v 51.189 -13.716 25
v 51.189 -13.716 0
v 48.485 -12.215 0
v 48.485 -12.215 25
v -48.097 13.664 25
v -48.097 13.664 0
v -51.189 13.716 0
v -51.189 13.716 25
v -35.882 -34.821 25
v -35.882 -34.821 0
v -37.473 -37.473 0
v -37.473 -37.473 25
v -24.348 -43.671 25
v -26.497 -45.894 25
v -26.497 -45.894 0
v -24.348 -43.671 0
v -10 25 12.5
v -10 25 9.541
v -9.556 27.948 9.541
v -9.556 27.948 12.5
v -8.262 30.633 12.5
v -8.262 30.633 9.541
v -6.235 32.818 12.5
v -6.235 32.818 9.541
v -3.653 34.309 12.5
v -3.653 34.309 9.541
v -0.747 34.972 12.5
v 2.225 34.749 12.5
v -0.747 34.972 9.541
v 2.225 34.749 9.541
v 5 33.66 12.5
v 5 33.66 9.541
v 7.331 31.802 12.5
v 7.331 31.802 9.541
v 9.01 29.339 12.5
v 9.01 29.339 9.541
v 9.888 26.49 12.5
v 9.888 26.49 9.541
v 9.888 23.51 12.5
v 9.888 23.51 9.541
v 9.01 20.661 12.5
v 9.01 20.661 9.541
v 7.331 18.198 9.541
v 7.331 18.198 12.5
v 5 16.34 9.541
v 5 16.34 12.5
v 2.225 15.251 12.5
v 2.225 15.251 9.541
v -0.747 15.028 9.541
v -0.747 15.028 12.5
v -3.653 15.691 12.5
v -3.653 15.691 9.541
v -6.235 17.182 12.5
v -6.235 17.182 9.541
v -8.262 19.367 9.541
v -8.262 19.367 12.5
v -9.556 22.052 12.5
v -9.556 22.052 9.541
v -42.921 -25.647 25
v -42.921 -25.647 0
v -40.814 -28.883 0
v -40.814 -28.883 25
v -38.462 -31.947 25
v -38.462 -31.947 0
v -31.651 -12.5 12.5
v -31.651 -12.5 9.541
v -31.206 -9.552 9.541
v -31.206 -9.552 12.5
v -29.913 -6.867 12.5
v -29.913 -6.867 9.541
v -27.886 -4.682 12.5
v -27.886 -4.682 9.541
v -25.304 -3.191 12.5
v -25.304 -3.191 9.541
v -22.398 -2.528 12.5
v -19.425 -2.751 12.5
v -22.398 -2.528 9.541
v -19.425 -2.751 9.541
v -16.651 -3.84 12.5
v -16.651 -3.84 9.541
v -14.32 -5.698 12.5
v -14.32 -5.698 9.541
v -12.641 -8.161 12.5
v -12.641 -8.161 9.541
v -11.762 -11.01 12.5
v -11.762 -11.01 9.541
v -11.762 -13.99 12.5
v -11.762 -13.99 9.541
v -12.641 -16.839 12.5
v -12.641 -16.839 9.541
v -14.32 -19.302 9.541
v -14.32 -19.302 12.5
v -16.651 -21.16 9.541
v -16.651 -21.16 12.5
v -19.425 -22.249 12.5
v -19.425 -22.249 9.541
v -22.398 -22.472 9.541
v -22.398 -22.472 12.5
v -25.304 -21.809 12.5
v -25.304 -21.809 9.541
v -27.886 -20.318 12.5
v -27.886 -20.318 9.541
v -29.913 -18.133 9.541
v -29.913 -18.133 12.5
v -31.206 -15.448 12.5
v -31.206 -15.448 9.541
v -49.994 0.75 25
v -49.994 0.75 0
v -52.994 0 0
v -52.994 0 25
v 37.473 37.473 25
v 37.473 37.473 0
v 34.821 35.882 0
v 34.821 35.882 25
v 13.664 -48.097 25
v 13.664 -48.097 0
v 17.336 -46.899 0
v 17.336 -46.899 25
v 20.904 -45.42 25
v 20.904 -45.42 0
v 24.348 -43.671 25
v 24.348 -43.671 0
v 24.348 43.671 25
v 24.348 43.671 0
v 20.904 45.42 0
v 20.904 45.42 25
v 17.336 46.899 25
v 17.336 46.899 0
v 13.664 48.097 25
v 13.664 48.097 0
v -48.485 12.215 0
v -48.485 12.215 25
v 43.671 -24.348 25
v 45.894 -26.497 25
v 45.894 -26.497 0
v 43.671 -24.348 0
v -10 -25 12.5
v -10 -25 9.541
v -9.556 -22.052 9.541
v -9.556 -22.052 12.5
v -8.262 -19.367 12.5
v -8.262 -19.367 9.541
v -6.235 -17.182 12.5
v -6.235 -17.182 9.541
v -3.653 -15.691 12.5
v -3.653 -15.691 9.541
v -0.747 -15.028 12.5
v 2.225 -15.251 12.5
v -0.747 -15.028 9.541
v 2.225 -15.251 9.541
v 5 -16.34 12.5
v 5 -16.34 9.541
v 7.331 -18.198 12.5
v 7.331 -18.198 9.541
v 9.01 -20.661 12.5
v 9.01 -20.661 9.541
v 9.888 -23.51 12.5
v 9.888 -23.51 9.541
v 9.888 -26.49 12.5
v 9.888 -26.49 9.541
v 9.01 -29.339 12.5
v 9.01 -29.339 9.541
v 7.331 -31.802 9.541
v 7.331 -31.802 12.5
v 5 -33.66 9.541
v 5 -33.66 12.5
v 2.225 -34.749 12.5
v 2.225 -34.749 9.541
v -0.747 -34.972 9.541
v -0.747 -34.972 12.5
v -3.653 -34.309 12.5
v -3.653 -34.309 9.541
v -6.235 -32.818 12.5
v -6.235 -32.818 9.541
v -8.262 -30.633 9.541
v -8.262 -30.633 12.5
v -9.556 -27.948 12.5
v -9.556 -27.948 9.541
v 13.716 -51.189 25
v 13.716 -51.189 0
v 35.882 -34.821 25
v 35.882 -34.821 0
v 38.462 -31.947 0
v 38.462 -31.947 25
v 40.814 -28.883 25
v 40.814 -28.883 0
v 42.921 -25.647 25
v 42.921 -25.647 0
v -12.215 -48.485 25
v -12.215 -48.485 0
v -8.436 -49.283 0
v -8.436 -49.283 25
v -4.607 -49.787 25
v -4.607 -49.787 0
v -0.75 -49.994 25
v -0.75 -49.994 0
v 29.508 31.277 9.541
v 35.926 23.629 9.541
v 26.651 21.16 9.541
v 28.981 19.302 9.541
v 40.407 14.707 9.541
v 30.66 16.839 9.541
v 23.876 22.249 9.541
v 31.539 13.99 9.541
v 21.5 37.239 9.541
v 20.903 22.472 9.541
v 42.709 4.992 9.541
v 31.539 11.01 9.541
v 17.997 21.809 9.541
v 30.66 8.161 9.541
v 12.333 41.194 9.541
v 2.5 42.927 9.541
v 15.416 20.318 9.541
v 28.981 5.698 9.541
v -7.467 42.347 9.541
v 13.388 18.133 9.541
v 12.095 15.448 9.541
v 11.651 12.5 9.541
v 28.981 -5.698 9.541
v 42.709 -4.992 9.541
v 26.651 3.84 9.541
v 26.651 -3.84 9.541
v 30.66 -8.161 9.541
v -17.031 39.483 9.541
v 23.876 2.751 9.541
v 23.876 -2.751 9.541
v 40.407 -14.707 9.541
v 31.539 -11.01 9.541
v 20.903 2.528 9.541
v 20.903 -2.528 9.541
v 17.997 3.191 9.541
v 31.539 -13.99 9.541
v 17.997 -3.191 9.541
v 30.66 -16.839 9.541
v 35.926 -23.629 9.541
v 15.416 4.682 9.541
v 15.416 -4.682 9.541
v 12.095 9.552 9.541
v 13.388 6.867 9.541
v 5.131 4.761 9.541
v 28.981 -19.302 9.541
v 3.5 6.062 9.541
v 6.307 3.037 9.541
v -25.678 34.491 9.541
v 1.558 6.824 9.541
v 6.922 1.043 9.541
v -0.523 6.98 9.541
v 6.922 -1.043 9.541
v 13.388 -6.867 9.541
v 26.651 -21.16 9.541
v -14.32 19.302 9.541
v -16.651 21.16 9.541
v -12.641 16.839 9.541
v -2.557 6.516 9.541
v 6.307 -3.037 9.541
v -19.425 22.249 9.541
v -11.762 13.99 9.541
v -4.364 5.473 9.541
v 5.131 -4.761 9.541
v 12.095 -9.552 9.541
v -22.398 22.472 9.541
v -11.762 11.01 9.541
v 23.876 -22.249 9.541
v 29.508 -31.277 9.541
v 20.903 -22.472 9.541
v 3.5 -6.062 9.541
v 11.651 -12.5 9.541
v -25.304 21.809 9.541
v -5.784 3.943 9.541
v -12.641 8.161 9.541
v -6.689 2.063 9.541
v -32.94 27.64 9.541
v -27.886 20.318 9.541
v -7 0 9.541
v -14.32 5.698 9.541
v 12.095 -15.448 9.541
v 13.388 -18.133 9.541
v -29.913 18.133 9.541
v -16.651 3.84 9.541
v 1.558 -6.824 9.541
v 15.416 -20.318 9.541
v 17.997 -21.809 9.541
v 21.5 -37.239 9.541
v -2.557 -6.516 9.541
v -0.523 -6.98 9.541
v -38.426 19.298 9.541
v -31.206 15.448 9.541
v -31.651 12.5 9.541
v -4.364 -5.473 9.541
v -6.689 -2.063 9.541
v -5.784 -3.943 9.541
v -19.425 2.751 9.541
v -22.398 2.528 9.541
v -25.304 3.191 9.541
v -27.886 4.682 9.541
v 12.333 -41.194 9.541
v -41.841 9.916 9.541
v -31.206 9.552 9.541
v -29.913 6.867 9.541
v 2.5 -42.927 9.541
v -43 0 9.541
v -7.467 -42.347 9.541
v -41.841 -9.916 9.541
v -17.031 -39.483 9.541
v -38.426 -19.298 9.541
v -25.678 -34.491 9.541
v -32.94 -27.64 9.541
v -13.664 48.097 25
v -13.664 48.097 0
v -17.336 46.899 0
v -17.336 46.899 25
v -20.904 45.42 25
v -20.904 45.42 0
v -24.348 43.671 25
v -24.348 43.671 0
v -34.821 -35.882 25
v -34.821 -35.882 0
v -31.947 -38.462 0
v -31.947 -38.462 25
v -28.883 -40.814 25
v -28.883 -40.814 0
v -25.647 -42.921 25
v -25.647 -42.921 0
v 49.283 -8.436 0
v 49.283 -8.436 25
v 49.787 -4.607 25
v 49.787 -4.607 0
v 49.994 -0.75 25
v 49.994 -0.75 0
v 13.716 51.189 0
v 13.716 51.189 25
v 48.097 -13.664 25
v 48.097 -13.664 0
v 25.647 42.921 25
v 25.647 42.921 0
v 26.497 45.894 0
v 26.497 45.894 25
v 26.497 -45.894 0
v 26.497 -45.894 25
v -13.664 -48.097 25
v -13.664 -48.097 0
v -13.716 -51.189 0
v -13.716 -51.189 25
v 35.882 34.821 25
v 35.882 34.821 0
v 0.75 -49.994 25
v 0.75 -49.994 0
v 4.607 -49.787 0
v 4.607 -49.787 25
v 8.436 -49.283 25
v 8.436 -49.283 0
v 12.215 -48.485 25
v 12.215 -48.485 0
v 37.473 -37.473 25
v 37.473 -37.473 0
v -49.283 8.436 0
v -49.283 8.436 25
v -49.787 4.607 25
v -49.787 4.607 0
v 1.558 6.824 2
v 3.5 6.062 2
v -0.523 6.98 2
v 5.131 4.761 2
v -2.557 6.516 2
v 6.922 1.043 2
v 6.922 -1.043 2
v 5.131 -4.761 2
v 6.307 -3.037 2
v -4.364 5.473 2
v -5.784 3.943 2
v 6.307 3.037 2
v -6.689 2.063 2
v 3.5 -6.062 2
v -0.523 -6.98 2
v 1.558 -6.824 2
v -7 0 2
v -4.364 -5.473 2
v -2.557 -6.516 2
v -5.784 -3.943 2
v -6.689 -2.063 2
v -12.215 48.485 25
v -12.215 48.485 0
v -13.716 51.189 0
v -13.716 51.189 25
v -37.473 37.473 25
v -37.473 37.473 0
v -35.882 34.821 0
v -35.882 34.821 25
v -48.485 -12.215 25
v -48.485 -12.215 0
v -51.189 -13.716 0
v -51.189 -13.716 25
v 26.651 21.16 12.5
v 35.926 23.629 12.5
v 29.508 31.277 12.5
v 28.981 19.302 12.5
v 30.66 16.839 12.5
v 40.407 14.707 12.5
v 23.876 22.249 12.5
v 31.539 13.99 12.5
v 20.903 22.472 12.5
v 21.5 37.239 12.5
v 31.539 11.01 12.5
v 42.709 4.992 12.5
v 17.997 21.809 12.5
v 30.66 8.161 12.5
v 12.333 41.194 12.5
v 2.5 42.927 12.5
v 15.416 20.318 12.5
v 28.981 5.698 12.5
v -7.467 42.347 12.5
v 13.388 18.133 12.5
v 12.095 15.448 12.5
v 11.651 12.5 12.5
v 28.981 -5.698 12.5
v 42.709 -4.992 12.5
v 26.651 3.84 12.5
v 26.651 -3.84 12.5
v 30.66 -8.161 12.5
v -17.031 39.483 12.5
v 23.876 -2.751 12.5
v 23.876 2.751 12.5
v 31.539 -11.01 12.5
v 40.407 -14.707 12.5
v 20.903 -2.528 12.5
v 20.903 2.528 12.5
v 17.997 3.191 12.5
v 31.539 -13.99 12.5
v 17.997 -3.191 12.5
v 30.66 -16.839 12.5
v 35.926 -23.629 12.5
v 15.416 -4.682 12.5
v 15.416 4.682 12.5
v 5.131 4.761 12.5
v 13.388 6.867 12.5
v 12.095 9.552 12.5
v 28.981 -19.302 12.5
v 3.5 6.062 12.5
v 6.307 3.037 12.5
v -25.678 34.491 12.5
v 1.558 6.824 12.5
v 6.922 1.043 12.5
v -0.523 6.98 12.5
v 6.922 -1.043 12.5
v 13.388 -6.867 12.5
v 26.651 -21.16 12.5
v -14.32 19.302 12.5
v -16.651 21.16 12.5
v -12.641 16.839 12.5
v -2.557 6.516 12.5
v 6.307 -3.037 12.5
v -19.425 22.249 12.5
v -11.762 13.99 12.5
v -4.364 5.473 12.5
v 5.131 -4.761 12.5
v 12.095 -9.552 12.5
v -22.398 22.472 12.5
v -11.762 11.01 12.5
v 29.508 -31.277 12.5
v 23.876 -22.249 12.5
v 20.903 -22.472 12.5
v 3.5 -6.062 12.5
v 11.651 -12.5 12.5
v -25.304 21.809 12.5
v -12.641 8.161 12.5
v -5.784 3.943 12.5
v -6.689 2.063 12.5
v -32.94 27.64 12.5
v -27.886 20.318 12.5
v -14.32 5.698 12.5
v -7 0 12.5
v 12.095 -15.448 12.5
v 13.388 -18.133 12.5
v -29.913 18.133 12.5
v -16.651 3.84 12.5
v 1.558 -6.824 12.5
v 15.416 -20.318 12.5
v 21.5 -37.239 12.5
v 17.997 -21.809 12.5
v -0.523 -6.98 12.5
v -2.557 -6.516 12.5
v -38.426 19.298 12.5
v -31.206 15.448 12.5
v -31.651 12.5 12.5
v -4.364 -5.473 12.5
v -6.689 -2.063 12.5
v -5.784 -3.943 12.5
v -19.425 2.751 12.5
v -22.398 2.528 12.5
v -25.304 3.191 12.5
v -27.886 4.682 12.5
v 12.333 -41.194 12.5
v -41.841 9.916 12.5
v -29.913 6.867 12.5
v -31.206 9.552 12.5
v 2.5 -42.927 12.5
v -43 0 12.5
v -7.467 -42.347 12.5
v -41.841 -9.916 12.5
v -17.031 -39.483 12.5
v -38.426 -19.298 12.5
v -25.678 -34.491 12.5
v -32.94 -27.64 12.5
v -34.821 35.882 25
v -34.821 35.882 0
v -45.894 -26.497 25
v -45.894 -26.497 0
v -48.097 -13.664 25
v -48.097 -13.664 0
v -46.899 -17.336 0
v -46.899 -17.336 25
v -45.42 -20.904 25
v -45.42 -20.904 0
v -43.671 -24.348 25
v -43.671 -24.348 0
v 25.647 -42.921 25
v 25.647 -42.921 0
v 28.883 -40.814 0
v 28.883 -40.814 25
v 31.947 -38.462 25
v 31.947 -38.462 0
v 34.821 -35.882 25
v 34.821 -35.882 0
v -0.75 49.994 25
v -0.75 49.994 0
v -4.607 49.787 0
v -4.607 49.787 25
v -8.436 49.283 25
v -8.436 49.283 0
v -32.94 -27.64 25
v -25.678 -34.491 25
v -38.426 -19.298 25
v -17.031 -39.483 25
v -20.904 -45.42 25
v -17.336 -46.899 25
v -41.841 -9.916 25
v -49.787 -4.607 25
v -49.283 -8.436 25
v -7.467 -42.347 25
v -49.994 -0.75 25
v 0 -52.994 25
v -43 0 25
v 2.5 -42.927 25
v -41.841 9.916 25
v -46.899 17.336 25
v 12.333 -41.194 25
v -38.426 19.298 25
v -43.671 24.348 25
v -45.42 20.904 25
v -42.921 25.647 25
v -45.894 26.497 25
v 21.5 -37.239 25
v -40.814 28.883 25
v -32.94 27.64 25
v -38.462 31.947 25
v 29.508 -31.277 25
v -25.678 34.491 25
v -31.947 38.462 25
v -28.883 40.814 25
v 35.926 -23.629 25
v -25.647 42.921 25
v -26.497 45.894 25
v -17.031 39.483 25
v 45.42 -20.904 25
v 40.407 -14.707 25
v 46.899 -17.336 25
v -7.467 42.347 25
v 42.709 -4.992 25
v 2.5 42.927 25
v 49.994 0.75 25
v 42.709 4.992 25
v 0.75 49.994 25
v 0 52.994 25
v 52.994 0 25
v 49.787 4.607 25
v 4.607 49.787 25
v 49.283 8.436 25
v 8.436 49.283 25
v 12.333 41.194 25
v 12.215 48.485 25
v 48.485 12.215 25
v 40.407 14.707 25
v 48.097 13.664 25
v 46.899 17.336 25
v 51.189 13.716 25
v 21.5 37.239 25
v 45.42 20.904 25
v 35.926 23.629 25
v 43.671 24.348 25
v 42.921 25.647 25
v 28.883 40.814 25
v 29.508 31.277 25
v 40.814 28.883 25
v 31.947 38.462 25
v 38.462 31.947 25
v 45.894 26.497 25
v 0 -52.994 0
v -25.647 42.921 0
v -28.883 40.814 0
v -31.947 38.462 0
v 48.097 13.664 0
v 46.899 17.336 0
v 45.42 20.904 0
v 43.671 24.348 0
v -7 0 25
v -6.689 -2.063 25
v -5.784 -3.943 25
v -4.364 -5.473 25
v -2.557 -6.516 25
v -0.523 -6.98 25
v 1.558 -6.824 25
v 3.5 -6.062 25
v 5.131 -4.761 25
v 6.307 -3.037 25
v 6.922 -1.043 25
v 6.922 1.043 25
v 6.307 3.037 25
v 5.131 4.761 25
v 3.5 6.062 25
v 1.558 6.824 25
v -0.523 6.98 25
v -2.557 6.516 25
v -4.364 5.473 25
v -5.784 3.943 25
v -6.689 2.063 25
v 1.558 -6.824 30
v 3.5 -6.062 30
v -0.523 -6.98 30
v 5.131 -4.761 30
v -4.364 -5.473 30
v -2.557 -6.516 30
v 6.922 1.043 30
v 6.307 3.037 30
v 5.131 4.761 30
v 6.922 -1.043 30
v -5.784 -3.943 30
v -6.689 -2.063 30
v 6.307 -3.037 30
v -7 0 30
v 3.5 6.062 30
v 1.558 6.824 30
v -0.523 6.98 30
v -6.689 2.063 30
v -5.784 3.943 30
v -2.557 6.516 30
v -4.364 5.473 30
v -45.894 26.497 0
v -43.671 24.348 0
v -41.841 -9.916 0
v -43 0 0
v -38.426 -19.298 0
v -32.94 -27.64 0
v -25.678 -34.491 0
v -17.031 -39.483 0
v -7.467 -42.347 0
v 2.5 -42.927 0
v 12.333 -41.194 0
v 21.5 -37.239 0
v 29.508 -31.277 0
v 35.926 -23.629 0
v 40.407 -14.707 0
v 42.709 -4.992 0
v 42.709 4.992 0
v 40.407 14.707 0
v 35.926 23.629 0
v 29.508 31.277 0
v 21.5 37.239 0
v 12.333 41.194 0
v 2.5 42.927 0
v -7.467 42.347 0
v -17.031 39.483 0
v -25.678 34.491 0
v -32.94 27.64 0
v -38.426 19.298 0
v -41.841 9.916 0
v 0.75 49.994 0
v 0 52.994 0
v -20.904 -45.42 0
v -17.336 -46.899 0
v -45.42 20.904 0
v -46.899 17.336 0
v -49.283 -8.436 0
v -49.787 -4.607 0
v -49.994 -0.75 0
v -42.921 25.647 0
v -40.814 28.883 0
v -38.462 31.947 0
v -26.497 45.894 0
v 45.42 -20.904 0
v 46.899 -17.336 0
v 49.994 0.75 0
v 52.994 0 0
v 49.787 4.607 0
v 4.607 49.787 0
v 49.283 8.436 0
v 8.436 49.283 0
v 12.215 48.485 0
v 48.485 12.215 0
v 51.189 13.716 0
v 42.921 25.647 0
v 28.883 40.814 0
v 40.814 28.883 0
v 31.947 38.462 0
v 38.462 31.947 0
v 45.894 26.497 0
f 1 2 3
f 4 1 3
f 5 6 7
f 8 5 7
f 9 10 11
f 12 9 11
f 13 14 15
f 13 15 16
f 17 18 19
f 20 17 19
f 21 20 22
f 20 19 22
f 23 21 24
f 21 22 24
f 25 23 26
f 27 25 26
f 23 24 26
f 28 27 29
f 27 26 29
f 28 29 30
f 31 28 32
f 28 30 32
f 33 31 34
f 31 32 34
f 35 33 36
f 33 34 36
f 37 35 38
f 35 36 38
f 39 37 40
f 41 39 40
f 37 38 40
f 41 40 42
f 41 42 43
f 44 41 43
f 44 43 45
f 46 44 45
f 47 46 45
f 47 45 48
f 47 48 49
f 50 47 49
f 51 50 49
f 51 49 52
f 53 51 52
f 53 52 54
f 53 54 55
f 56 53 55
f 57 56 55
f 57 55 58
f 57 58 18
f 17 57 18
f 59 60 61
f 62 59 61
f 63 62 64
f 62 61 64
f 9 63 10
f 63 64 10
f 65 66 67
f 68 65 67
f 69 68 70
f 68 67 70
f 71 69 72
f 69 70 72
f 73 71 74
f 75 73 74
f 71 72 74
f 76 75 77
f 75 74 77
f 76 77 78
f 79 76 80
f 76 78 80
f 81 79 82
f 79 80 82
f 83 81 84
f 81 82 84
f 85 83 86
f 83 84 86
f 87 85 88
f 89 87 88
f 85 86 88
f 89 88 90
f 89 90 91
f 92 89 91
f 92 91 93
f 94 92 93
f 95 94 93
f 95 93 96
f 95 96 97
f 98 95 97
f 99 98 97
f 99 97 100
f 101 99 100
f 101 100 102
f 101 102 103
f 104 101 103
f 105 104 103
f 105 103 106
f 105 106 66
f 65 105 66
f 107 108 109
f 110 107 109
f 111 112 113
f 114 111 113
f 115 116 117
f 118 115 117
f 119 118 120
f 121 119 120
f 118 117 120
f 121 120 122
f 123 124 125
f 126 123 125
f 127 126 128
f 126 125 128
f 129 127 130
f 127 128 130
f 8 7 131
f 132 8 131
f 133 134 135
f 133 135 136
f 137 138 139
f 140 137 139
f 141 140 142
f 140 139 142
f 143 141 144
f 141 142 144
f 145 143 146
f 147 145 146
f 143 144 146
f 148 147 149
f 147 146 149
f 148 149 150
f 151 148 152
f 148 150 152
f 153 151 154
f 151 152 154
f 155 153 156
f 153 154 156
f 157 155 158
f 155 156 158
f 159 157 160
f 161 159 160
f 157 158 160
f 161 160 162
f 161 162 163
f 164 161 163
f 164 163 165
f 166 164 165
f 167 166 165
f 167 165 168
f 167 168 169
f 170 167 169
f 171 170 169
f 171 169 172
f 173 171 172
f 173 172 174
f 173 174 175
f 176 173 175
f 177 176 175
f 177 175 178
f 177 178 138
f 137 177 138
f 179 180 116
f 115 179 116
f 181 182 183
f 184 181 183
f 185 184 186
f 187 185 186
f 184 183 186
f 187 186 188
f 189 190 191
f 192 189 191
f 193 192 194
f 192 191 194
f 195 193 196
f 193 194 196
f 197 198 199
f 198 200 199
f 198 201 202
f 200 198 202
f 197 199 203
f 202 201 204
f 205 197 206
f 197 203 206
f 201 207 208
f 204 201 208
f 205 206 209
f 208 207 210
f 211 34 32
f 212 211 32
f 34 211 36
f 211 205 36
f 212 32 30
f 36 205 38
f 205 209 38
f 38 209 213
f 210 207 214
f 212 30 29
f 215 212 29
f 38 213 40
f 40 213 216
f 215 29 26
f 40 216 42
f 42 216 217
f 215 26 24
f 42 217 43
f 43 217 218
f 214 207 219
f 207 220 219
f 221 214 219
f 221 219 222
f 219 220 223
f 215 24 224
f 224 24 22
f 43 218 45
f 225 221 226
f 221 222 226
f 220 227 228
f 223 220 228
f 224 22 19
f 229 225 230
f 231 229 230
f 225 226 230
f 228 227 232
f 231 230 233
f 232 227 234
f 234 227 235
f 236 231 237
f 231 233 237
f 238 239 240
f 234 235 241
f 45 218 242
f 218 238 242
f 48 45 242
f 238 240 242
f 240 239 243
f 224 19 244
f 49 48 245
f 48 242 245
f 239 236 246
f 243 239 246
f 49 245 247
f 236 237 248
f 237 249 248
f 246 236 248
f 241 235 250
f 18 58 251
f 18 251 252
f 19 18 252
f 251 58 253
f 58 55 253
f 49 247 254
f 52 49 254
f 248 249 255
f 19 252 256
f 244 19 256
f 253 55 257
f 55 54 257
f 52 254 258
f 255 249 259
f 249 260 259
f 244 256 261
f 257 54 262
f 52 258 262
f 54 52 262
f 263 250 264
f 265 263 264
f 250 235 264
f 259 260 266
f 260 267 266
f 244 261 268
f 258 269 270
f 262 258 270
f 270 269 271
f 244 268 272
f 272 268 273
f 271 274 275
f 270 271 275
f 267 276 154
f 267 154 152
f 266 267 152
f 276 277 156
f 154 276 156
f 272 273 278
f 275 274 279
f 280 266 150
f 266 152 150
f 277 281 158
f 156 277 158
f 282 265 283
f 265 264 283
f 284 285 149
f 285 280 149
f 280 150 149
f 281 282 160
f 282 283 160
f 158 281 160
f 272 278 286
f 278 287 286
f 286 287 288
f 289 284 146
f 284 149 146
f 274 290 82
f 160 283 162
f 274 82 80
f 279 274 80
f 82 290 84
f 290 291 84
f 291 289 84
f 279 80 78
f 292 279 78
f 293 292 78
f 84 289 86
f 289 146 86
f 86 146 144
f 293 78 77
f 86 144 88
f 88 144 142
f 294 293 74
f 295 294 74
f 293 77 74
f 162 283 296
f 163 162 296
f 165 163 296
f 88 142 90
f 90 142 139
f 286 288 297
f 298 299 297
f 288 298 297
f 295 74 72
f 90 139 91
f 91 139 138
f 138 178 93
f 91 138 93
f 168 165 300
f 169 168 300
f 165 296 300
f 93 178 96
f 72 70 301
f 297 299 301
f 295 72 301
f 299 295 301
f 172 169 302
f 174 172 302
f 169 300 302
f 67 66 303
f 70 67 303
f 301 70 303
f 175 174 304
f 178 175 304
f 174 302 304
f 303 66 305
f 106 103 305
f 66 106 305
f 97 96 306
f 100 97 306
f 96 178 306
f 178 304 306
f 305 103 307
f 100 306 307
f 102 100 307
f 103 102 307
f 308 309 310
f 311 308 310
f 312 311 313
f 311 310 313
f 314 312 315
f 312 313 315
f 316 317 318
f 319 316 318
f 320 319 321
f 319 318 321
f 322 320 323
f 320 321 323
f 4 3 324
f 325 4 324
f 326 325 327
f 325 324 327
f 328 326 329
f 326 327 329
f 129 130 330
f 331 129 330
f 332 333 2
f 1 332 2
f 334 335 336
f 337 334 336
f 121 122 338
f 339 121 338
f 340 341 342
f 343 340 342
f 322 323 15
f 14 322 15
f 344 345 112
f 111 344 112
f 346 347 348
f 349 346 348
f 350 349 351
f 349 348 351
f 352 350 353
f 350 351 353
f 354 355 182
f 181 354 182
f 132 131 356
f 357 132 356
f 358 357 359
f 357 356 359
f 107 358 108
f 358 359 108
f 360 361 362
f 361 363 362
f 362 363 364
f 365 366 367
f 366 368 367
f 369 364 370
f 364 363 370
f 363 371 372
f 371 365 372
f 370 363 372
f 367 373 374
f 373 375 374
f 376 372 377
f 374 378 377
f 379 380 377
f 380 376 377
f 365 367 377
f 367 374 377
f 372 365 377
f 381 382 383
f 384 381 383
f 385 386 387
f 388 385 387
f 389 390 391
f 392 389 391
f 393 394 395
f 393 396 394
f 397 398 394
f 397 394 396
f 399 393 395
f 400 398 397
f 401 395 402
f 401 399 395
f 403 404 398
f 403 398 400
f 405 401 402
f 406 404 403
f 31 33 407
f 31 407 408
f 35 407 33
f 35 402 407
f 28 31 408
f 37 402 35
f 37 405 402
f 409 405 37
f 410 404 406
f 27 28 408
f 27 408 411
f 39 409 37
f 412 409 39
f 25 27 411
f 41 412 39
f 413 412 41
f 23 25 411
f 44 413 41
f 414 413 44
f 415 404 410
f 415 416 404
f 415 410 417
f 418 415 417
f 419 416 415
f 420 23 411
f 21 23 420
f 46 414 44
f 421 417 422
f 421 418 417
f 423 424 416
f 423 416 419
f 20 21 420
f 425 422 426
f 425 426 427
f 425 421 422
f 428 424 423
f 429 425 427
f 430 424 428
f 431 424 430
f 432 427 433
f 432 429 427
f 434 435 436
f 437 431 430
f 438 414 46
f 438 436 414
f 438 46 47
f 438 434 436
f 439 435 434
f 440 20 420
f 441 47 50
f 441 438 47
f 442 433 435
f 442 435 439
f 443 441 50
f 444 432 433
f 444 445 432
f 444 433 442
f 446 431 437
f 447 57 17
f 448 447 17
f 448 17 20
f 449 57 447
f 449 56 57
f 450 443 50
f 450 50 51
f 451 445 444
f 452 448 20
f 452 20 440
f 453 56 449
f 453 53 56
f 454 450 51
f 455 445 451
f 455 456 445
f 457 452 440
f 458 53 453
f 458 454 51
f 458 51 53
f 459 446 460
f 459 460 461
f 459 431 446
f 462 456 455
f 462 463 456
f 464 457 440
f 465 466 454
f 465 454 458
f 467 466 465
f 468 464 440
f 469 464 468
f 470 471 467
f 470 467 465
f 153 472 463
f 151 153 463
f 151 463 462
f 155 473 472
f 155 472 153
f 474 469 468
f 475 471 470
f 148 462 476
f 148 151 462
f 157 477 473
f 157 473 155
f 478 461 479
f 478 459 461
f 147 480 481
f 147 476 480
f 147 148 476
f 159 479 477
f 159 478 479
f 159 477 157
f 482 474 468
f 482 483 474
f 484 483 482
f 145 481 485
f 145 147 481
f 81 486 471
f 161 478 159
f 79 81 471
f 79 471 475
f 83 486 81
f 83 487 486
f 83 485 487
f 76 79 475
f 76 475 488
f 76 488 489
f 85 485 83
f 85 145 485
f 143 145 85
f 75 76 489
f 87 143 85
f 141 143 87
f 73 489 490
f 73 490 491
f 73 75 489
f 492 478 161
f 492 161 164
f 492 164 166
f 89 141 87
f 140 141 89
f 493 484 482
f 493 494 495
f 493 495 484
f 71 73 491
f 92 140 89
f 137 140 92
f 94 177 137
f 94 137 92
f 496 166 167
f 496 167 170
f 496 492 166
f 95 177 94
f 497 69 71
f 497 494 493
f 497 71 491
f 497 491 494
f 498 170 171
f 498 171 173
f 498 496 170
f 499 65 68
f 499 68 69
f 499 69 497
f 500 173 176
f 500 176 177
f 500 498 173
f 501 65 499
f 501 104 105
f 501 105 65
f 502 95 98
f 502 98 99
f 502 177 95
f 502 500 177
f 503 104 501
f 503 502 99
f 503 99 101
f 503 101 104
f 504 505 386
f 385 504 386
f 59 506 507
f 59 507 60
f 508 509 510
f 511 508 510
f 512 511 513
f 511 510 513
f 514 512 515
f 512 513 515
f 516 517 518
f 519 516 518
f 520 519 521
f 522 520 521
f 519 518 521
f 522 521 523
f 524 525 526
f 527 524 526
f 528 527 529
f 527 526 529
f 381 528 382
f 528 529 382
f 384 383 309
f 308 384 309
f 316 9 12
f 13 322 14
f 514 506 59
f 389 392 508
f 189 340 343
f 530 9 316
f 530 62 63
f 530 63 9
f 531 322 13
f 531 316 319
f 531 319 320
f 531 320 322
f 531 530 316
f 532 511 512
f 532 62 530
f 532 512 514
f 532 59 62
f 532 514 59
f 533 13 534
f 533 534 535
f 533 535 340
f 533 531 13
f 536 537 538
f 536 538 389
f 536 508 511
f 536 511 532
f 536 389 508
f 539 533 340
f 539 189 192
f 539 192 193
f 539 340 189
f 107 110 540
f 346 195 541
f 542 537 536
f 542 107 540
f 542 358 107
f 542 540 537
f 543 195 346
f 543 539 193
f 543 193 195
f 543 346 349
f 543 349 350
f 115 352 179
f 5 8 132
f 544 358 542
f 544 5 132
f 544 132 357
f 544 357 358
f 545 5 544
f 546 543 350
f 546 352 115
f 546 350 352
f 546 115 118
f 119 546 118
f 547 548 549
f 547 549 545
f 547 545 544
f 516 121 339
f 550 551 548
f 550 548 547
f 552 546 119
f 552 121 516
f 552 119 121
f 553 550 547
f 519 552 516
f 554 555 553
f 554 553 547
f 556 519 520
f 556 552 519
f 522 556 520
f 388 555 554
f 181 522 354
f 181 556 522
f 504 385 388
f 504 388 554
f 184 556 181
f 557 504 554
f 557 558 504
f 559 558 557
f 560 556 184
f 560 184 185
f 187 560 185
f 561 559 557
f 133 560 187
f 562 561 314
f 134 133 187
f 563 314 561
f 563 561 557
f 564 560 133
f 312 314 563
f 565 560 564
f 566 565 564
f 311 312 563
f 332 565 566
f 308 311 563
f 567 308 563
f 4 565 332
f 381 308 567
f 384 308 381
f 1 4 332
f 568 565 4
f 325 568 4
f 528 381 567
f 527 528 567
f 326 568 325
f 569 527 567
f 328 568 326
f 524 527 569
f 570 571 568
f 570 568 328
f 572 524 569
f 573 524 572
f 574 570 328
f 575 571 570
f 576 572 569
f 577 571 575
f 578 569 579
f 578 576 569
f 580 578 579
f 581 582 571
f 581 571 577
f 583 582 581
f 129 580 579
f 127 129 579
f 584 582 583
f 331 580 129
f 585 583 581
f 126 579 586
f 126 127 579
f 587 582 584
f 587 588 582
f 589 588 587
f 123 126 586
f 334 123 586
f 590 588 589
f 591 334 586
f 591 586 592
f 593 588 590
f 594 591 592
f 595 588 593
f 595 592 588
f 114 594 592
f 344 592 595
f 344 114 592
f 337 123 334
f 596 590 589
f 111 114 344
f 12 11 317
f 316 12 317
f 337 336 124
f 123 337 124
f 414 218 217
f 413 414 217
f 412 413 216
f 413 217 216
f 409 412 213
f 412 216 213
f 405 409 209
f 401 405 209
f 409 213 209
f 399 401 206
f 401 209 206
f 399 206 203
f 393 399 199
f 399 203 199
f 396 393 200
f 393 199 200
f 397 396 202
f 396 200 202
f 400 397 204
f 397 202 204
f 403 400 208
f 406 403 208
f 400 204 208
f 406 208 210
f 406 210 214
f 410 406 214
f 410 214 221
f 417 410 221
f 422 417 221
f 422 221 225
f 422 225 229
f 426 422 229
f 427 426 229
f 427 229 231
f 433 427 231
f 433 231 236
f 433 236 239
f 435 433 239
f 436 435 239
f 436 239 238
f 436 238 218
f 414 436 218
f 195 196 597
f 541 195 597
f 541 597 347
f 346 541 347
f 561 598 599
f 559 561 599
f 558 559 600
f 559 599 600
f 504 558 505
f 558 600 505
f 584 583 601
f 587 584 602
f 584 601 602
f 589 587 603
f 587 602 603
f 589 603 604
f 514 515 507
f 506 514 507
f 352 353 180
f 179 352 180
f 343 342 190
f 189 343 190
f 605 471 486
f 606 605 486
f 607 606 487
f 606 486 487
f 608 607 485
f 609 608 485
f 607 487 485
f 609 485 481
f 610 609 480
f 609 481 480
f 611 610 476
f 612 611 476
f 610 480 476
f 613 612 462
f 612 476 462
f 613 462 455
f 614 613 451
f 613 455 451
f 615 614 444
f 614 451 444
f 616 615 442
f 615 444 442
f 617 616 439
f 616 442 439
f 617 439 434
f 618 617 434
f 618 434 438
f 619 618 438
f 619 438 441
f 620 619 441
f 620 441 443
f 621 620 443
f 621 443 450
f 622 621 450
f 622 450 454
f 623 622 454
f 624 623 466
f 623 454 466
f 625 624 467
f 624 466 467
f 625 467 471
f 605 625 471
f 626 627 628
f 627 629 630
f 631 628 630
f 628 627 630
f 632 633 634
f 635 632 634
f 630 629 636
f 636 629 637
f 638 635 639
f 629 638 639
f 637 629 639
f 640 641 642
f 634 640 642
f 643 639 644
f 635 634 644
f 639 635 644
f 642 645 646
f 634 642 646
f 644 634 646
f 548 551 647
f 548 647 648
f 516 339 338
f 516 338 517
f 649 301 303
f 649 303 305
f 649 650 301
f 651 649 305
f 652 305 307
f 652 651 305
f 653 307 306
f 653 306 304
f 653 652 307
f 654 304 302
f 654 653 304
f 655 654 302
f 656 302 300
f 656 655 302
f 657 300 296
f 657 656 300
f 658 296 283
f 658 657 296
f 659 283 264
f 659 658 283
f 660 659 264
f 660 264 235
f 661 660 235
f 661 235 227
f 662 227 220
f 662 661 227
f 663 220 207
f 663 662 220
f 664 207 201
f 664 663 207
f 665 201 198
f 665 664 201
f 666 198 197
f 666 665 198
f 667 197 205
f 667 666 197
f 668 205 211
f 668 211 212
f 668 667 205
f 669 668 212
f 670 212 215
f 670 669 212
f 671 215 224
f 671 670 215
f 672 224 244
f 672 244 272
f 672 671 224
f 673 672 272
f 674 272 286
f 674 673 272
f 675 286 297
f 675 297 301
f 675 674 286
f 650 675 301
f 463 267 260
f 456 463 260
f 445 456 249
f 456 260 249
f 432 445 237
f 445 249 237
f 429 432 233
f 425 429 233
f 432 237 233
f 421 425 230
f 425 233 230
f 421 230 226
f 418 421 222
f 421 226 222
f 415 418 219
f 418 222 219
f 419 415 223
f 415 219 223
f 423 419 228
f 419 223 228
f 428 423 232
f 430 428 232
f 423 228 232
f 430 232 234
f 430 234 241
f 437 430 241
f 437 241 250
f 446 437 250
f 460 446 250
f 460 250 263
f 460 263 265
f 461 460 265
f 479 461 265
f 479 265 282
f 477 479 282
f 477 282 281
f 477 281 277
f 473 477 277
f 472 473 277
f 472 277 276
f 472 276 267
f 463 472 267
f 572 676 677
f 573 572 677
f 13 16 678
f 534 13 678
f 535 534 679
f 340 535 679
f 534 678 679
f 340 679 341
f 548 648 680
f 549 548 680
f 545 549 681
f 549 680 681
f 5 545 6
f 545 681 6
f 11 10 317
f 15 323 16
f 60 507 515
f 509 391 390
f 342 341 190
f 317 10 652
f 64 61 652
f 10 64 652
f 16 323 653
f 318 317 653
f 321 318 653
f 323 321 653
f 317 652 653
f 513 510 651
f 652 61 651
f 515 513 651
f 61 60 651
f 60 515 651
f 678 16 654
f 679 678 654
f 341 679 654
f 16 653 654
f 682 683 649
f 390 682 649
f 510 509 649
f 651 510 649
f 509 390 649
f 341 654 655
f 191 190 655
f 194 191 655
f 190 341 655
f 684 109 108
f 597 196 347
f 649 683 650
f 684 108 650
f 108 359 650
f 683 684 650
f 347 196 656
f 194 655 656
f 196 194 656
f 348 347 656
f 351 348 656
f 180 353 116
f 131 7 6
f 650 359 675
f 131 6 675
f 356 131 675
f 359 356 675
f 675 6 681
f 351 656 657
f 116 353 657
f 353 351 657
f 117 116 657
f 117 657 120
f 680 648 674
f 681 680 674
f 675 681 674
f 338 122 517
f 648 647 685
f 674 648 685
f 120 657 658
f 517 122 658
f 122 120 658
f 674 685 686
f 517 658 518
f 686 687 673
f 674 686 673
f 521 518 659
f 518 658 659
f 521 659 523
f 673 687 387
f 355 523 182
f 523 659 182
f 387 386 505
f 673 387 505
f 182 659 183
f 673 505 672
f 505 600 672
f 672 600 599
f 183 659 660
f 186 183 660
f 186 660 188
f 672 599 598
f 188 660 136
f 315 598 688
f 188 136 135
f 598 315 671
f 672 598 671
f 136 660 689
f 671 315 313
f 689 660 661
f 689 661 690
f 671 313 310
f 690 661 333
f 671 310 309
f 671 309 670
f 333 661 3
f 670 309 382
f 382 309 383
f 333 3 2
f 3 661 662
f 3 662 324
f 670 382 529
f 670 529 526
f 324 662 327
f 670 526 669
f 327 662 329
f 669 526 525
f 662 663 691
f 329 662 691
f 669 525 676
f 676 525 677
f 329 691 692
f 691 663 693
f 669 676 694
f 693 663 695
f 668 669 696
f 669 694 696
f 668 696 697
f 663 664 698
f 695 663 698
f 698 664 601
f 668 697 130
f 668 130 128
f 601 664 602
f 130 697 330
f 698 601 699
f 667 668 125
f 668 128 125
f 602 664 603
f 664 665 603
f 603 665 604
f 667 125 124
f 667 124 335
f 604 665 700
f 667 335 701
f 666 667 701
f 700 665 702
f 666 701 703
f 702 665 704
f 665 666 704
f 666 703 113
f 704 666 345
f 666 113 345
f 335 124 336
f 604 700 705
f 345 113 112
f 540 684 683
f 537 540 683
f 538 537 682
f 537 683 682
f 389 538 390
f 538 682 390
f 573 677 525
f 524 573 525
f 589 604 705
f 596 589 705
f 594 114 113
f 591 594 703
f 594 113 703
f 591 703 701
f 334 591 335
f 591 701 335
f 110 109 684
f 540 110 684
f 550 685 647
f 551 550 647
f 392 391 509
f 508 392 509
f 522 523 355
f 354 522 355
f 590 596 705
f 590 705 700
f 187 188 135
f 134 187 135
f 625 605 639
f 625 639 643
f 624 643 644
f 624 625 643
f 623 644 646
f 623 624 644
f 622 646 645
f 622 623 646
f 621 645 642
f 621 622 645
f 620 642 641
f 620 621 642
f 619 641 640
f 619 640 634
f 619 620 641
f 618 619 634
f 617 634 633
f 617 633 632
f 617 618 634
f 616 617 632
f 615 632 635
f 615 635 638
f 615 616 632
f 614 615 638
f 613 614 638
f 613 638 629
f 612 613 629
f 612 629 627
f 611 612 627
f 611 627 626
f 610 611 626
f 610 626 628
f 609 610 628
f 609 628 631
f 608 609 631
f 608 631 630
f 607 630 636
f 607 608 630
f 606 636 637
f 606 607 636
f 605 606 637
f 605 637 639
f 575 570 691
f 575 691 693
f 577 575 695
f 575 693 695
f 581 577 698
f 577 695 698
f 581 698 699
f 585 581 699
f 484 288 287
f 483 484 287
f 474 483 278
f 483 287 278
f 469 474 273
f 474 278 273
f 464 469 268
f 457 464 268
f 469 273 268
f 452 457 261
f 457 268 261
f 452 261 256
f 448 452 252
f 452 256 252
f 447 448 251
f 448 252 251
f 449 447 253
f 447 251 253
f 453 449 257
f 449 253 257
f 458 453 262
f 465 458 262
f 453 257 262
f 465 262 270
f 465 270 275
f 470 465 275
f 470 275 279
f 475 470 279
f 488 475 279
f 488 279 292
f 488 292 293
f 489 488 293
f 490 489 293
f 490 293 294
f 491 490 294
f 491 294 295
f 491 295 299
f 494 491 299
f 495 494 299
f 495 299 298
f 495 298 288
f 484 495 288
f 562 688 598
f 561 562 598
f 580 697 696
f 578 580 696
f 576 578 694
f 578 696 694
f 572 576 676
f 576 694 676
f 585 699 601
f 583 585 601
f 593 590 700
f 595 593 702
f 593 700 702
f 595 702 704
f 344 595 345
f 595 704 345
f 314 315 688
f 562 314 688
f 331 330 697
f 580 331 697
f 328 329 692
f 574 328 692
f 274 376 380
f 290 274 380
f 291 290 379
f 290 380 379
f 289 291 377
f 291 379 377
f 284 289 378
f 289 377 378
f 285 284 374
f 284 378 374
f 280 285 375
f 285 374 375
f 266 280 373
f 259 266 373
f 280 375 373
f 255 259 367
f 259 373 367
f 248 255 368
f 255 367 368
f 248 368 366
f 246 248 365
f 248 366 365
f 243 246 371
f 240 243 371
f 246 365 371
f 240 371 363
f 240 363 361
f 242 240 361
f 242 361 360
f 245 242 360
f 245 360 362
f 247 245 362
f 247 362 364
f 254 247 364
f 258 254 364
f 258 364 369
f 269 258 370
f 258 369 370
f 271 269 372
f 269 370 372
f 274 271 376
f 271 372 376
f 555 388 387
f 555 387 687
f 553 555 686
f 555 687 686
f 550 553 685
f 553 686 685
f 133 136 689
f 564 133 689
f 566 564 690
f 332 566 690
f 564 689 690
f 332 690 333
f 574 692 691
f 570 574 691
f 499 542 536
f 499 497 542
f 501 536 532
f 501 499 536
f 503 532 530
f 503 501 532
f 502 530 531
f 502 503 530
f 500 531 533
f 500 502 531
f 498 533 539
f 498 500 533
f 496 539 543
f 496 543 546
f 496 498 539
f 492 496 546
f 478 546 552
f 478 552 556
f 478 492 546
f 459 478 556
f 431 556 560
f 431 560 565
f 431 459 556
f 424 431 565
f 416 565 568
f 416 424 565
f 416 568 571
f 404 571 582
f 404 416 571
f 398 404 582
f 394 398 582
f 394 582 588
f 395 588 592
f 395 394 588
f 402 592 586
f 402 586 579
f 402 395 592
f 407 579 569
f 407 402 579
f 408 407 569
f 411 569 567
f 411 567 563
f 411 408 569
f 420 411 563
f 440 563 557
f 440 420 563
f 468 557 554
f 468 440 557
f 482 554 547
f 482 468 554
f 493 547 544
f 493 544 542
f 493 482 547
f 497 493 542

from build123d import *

# Parameters (mm, degrees)
SKETCH1_R           = 50
BOSS_EXTRUDE1_DEPTH = 25
SKETCH2_W           = 9.541105513
SKETCH2_H           = 36
SKETCH2_W_2         = 12.5
SKETCH2_4_W         = 9.541105513
SKETCH2_4_H         = 36
SKETCH2_4_W_2       = 12.5
SKETCH5_W           = 5
SKETCH5_H           = 7
SKETCH6_W           = 2
SKETCH6_H           = 9
SKETCH7_R           = 10
CUT_EXTRUDE1_DEPTH  = 74.610911988
BOSS_EXTRUDE2_DEPTH = 25
CIRPATTERN1_DEPTH   = 25


# Read off the part's stored shape, not the designer's step: CirPattern1
with BuildPart() as part:
    # Sketch1 → Boss-Extrude1 (new body)
    with BuildSketch(Plane.XY):
        Circle(SKETCH1_R)
    extrude(amount=BOSS_EXTRUDE1_DEPTH)

    # Sketch2 → Revolve1 (revolve)
    with BuildSketch(Plane(origin=(0, 0, 0), x_dir=(0, 0, -1), z_dir=(1, 0, 0))):
        with Locations((-4.770552756, -25)):
            Rectangle(SKETCH2_W, SKETCH2_H)
        with Locations((-18.75, -25)):
            Rectangle(SKETCH2_W_2, SKETCH2_H)
    revolve(axis=Axis((0, 0, -54.580519766), (0, 0, 1)))

    # Sketch2<4> → Cut-Revolve1 (revolve, cut)
    with BuildSketch(Plane(origin=(0, 0, 0), x_dir=(0, 0, -1), z_dir=(1, 0, 0)), mode=Mode.PRIVATE) as cut_revolve1_sk:
        with Locations((-4.770552756, -25)):
            Rectangle(SKETCH2_4_W, SKETCH2_4_H)
        with Locations((-18.75, -25)):
            Rectangle(SKETCH2_4_W_2, SKETCH2_4_H)
    revolve(cut_revolve1_sk.sketch.rotate(Axis((0, 0, -54.580519766), (0, 0, 1)), 270), axis=Axis((0, 0, -54.580519766), (0, 0, 1)), mode=Mode.SUBTRACT)

    # Sketch5 → Revolve3 (revolve)
    with BuildSketch(Plane(origin=(0, 0, 0), x_dir=(0, 0, -1), z_dir=(1, 0, 0)), mode=Mode.PRIVATE) as revolve3_sk:
        with Locations((-27.5, -3.5)):
            Rectangle(SKETCH5_W, SKETCH5_H)
    revolve(revolve3_sk.sketch.rotate(Axis((0, 0, 64.707463348), (0, 0, -1)), 90), axis=Axis((0, 0, 64.707463348), (0, 0, -1)))

    # Sketch6 → Cut-Revolve2 (revolve, cut)
    with BuildSketch(Plane(origin=(0, 0, 0), x_dir=(0, 0, -1), z_dir=(1, 0, 0)), mode=Mode.PRIVATE) as cut_revolve2_sk:
        with Locations((-1, -4.5)):
            Rectangle(SKETCH6_W, SKETCH6_H)
    revolve(cut_revolve2_sk.sketch.rotate(Axis((0, 0, -41.001610393), (0, 0, 1)), 270), axis=Axis((0, 0, -41.001610393), (0, 0, 1)), mode=Mode.SUBTRACT)

    # Sketch7 → Cut-Extrude1 (cut, through all)
    with BuildSketch(Plane(origin=(0, 0, 9.541105513), x_dir=(-1, 0, 0), z_dir=(0, 0, -1))):
        with Locations((0, 25)):
            Circle(SKETCH7_R)
        with Locations((21.650635095, 12.5)):
            Circle(SKETCH7_R)
        with Locations((21.650635095, -12.5)):
            Circle(SKETCH7_R)
        with Locations((0, -25)):
            Circle(SKETCH7_R)
        with Locations((-21.650635095, -12.5)):
            Circle(SKETCH7_R)
        with Locations((-21.650635095, 12.5)):
            Circle(SKETCH7_R)
    extrude(amount=-CUT_EXTRUDE1_DEPTH, mode=Mode.SUBTRACT)

    # Sketch8 → Boss-Extrude2 (add)
    with BuildSketch(Plane(origin=(0, 0, 0), x_dir=(-1, 0, 0), z_dir=(0, 0, -1))):
        with BuildLine():
            Line((-0.75, 49.994374684), (0, 52.994374684))
            Line((0, 52.994374684), (0.75, 49.994374684))
            ThreePointArc((0.75, 49.994374684), (0, 50), (-0.75, 49.994374684))
        make_face()
    extrude(amount=-BOSS_EXTRUDE2_DEPTH)

    # CirPattern1 outline → CirPattern1 (add)
    with BuildSketch(Plane.XY):
        with BuildLine():
            Line((-12.215051946, 48.48497196), (-13.715953451, 51.188635155))
            Line((-13.715953451, 51.188635155), (-13.663940686, 48.096743393))
            ThreePointArc((-13.663940686, 48.096743393), (-12.940952255, 48.296291315), (-12.215051946, 48.48497196))
        make_face()
        with BuildLine():
            ThreePointArc((12.215051946, 48.48497196), (12.940952255, 48.296291315), (13.663940686, 48.096743393))
            Line((13.663940686, 48.096743393), (13.715953451, 51.188635155))
            Line((13.715953451, 51.188635155), (12.215051946, 48.48497196))
        make_face()
        with BuildLine():
            ThreePointArc((24.347668289, 43.671398523), (25, 43.301270189), (25.646706395, 42.921398522))
            Line((25.646706395, 42.921398522), (26.497187342, 45.894474734))
            Line((26.497187342, 45.894474734), (24.347668289, 43.671398523))
        make_face()
        with BuildLine():
            ThreePointArc((34.821031274, 35.881691446), (35.35533906, 35.35533906), (35.881691446, 34.821031274))
            Line((35.881691446, 34.821031274), (37.472681703, 37.472681703))
            Line((37.472681703, 37.472681703), (34.821031274, 35.881691446))
        make_face()
        with BuildLine():
            ThreePointArc((42.921398522, 25.646706395), (43.301270189, 25), (43.671398522, 24.347668289))
            Line((43.671398522, 24.347668289), (45.894474734, 26.497187342))
            Line((45.894474734, 26.497187342), (42.921398522, 25.646706395))
        make_face()
        with BuildLine():
            ThreePointArc((48.096743392, 13.663940686), (48.296291315, 12.940952255), (48.48497196, 12.215051946))
            Line((48.48497196, 12.215051946), (51.188635155, 13.715953451))
            Line((51.188635155, 13.715953451), (48.096743392, 13.663940686))
        make_face()
        with BuildLine():
            ThreePointArc((49.994374684, 0.75), (50, 0), (49.994374684, -0.75))
            Line((49.994374684, -0.75), (52.994374684, 0))
            Line((52.994374684, 0), (49.994374684, 0.75))
        make_face()
        with BuildLine():
            ThreePointArc((48.48497196, -12.215051946), (48.296291315, -12.940952255), (48.096743392, -13.663940686))
            Line((48.096743392, -13.663940686), (51.188635155, -13.715953451))
            Line((51.188635155, -13.715953451), (48.48497196, -12.215051946))
        make_face()
        with BuildLine():
            ThreePointArc((43.671398522, -24.347668289), (43.301270189, -25), (42.921398522, -25.646706395))
            Line((42.921398522, -25.646706395), (45.894474734, -26.497187342))
            Line((45.894474734, -26.497187342), (43.671398522, -24.347668289))
        make_face()
        with BuildLine():
            ThreePointArc((35.881691446, -34.821031274), (35.355339059, -35.355339059), (34.821031274, -35.881691446))
            Line((34.821031274, -35.881691446), (37.472681703, -37.472681703))
            Line((37.472681703, -37.472681703), (35.881691446, -34.821031274))
        make_face()
        with BuildLine():
            ThreePointArc((25.646706395, -42.921398522), (25, -43.301270189), (24.347668289, -43.671398522))
            Line((24.347668289, -43.671398522), (26.497187342, -45.894474734))
            Line((26.497187342, -45.894474734), (25.646706395, -42.921398522))
        make_face()
        with BuildLine():
            ThreePointArc((13.663940686, -48.096743392), (12.940952255, -48.296291314), (12.215051946, -48.48497196))
            Line((12.215051946, -48.48497196), (13.715953451, -51.188635155))
            Line((13.715953451, -51.188635155), (13.663940686, -48.096743392))
        make_face()
        with BuildLine():
            ThreePointArc((0.75, -49.994374684), (0, -50), (-0.75, -49.994374684))
            Line((-0.75, -49.994374684), (0, -52.994374684))
            Line((0, -52.994374684), (0.75, -49.994374684))
        make_face()
        with BuildLine():
            ThreePointArc((-12.215051946, -48.48497196), (-12.940952255, -48.296291314), (-13.663940686, -48.096743392))
            Line((-13.663940686, -48.096743392), (-13.715953451, -51.188635155))
            Line((-13.715953451, -51.188635155), (-12.215051946, -48.48497196))
        make_face()
        with BuildLine():
            ThreePointArc((-24.347668289, -43.671398522), (-25, -43.301270189), (-25.646706395, -42.921398522))
            Line((-25.646706395, -42.921398522), (-26.497187342, -45.894474734))
            Line((-26.497187342, -45.894474734), (-24.347668289, -43.671398522))
        make_face()
        with BuildLine():
            ThreePointArc((-34.821031274, -35.881691446), (-35.355339059, -35.355339059), (-35.881691446, -34.821031274))
            Line((-35.881691446, -34.821031274), (-37.472681703, -37.472681703))
            Line((-37.472681703, -37.472681703), (-34.821031274, -35.881691446))
        make_face()
        with BuildLine():
            ThreePointArc((-42.921398522, -25.646706395), (-43.301270189, -25), (-43.671398522, -24.347668289))
            Line((-43.671398522, -24.347668289), (-45.894474734, -26.497187342))
            Line((-45.894474734, -26.497187342), (-42.921398522, -25.646706395))
        make_face()
        with BuildLine():
            ThreePointArc((-48.096743392, -13.663940686), (-48.296291315, -12.940952255), (-48.48497196, -12.215051946))
            Line((-48.48497196, -12.215051946), (-51.188635155, -13.715953451))
            Line((-51.188635155, -13.715953451), (-48.096743392, -13.663940686))
        make_face()
        with BuildLine():
            ThreePointArc((-49.994374684, -0.75), (-50, 0), (-49.994374684, 0.75))
            Line((-49.994374684, 0.75), (-52.994374684, 0))
            Line((-52.994374684, 0), (-49.994374684, -0.75))
        make_face()
        with BuildLine():
            ThreePointArc((-48.48497196, 12.215051946), (-48.296291315, 12.940952255), (-48.096743392, 13.663940686))
            Line((-48.096743392, 13.663940686), (-51.188635155, 13.715953451))
            Line((-51.188635155, 13.715953451), (-48.48497196, 12.215051946))
        make_face()
        with BuildLine():
            ThreePointArc((-43.671398522, 24.347668289), (-43.301270189, 25), (-42.921398522, 25.646706395))
            Line((-42.921398522, 25.646706395), (-45.894474734, 26.497187342))
            Line((-45.894474734, 26.497187342), (-43.671398522, 24.347668289))
        make_face()
        with BuildLine():
            ThreePointArc((-35.881691446, 34.821031274), (-35.35533906, 35.35533906), (-34.821031274, 35.881691446))
            Line((-34.821031274, 35.881691446), (-37.472681703, 37.472681703))
            Line((-37.472681703, 37.472681703), (-35.881691446, 34.821031274))
        make_face()
        with BuildLine():
            ThreePointArc((-25.646706395, 42.921398522), (-25, 43.301270189), (-24.347668289, 43.671398523))
            Line((-24.347668289, 43.671398523), (-26.497187342, 45.894474734))
            Line((-26.497187342, 45.894474734), (-25.646706395, 42.921398522))
        make_face()
    extrude(amount=CIRPATTERN1_DEPTH)


solid = part.part
